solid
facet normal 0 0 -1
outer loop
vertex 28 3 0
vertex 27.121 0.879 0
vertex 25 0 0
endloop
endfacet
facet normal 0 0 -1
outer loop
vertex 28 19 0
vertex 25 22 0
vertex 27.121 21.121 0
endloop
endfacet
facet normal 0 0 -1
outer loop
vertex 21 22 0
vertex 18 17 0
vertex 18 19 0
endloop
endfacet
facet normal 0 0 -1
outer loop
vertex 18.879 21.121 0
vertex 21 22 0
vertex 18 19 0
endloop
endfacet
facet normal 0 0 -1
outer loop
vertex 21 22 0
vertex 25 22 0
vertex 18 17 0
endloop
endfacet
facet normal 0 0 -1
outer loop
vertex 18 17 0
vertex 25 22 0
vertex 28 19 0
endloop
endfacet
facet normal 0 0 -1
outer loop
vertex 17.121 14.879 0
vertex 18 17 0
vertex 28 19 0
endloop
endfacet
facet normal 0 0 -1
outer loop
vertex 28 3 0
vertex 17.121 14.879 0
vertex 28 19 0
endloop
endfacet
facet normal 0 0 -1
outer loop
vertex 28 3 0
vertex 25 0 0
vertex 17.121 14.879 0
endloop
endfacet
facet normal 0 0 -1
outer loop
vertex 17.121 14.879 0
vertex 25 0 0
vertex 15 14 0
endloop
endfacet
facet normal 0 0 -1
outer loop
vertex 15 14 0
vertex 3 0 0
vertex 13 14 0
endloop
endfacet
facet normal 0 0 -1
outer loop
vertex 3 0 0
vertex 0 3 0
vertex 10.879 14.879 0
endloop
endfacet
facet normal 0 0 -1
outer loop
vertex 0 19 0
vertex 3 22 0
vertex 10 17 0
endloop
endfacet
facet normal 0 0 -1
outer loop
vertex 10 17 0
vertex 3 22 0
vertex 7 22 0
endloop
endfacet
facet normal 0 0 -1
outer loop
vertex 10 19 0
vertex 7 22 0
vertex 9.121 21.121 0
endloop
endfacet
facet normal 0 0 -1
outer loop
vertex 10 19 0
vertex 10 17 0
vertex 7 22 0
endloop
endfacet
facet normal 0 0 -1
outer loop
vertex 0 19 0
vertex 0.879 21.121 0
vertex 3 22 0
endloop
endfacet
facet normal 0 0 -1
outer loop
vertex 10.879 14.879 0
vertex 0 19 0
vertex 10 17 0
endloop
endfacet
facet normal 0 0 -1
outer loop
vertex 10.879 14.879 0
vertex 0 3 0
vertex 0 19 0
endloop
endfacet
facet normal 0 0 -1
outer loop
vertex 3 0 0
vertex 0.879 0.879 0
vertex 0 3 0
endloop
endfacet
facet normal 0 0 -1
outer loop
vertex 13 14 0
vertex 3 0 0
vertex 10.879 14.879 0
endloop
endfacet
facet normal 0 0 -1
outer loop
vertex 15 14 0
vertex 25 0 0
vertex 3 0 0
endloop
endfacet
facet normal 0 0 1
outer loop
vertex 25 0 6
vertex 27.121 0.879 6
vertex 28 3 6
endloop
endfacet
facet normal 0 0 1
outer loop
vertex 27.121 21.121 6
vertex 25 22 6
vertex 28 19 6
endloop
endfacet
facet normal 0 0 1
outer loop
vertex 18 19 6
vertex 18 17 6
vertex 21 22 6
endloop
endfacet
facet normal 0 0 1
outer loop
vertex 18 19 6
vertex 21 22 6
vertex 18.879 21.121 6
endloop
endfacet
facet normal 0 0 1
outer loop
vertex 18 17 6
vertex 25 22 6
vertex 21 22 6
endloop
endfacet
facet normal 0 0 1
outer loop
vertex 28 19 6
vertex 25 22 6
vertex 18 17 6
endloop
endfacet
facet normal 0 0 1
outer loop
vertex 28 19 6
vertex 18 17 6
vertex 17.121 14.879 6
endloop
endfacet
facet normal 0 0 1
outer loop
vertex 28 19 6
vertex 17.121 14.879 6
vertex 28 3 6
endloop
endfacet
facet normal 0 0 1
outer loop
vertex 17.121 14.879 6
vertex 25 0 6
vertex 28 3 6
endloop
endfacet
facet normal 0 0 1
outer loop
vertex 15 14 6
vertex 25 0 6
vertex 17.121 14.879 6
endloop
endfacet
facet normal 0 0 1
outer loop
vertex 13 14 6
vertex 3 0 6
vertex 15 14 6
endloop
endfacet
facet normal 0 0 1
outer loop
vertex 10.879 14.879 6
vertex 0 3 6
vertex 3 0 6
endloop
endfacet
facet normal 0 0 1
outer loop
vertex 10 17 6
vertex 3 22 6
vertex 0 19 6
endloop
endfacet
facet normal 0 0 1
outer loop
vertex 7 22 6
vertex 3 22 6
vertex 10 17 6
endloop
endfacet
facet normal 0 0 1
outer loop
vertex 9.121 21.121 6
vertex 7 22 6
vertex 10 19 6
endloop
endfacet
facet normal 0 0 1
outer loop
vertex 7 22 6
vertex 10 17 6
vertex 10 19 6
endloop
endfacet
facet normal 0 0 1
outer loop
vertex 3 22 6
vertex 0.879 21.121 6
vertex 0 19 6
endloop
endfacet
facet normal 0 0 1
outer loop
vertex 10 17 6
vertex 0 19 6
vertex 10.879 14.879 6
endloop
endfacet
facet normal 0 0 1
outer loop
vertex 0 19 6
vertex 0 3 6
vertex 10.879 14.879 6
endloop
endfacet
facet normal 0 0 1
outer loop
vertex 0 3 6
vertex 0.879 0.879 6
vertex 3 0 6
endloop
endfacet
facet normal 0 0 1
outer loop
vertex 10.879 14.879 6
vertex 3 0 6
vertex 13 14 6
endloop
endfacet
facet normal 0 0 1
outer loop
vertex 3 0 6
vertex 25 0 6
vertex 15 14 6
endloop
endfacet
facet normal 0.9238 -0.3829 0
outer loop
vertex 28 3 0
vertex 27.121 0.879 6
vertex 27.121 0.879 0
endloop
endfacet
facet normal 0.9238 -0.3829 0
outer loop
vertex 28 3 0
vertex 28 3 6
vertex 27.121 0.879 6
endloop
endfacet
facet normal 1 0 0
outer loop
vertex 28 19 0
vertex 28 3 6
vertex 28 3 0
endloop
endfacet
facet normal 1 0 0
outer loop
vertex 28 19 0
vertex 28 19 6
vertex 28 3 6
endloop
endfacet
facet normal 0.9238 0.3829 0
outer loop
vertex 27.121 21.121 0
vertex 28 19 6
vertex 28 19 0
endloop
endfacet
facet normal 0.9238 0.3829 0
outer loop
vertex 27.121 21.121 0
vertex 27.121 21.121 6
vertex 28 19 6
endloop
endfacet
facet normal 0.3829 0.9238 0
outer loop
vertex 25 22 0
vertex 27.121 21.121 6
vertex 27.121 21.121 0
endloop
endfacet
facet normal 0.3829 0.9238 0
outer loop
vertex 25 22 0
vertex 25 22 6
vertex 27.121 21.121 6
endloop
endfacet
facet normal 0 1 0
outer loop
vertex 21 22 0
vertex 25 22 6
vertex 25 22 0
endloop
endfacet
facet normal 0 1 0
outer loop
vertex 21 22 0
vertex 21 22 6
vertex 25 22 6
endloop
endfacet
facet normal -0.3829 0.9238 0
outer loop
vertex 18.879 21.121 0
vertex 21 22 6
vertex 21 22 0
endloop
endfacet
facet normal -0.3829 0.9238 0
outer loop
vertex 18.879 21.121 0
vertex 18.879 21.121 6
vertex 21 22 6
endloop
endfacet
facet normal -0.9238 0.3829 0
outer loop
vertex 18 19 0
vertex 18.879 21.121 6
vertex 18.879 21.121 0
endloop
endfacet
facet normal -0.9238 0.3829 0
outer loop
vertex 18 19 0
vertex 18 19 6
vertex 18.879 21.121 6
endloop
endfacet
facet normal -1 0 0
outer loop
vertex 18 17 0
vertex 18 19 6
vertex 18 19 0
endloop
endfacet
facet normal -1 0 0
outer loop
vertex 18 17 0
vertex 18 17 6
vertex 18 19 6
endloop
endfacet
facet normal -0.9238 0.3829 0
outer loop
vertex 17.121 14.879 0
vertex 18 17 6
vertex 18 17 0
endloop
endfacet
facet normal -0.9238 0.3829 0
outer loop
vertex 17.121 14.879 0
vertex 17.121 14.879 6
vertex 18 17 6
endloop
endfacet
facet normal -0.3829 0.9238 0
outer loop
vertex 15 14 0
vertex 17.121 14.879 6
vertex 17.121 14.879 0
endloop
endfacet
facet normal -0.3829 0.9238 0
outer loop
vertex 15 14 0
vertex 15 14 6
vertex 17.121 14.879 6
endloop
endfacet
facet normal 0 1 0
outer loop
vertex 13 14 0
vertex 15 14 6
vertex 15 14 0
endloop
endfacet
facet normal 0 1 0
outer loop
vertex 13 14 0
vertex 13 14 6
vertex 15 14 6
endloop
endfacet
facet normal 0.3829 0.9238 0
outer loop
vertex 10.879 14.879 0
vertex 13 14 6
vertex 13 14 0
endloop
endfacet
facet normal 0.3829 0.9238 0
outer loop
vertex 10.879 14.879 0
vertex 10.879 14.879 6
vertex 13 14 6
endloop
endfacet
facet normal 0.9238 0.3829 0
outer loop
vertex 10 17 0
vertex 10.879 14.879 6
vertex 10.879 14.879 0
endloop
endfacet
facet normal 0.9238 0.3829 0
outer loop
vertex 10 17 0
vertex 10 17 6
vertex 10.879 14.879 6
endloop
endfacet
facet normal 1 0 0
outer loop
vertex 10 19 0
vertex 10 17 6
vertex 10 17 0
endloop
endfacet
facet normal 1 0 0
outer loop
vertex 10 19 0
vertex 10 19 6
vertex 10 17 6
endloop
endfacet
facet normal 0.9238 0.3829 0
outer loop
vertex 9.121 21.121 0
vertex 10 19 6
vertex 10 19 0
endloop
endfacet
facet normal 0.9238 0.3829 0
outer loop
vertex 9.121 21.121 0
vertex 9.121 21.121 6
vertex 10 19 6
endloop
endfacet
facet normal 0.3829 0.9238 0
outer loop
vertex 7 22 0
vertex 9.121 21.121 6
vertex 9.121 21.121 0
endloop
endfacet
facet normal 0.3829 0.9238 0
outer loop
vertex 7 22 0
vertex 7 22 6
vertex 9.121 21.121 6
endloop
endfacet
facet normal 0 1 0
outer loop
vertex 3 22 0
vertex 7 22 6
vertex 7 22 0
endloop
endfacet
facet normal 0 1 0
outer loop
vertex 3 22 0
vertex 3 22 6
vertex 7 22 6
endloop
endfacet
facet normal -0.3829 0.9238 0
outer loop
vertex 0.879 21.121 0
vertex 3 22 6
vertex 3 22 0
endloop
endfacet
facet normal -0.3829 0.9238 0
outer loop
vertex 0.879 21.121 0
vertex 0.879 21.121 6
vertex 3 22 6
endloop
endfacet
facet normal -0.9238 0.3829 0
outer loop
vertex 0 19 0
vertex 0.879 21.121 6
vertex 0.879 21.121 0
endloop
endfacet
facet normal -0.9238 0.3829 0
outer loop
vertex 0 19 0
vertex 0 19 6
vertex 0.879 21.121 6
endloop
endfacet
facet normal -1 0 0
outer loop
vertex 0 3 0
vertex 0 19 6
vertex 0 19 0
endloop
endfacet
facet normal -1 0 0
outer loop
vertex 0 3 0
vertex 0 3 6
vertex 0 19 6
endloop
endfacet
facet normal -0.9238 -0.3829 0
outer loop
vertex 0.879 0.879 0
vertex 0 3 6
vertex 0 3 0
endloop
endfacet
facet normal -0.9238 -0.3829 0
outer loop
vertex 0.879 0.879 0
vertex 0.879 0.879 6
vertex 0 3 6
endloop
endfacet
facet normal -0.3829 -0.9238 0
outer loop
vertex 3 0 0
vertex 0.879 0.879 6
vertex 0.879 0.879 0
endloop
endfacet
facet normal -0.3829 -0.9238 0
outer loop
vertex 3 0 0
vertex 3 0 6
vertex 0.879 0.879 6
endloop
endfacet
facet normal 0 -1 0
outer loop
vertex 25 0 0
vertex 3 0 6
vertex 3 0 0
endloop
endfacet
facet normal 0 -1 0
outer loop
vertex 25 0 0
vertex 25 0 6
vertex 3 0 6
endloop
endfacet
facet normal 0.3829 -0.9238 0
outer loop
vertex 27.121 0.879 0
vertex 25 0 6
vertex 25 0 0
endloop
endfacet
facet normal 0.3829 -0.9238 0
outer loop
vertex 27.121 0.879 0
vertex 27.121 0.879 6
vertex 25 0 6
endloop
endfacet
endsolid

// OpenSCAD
$fn = 32;

// ----------------------------------------------------------------------
// Eye lug: clevis, 6 mm thick
// ----------------------------------------------------------------------

// --- parameters (mm) ---
profile_height = 6;       // extrusion height
profile_points = 24;      // points of the closed outline

profile = [[0, 3], [0.879, 0.879], [3, 0], [25, 0], [27.121, 0.879], [28, 3], [28, 19], [27.121, 21.121], [25, 22], [21, 22], [18.879, 21.121], [18, 19], [18, 17], [17.121, 14.879], [15, 14], [13, 14], [10.879, 14.879], [10, 17], [10, 19], [9.121, 21.121], [7, 22], [3, 22], [0.879, 21.121], [0, 19]];  // single closed polygon, 24 points, counter clockwise

// --- the one profile operation ---
linear_extrude(height = profile_height) polygon(points = profile);
